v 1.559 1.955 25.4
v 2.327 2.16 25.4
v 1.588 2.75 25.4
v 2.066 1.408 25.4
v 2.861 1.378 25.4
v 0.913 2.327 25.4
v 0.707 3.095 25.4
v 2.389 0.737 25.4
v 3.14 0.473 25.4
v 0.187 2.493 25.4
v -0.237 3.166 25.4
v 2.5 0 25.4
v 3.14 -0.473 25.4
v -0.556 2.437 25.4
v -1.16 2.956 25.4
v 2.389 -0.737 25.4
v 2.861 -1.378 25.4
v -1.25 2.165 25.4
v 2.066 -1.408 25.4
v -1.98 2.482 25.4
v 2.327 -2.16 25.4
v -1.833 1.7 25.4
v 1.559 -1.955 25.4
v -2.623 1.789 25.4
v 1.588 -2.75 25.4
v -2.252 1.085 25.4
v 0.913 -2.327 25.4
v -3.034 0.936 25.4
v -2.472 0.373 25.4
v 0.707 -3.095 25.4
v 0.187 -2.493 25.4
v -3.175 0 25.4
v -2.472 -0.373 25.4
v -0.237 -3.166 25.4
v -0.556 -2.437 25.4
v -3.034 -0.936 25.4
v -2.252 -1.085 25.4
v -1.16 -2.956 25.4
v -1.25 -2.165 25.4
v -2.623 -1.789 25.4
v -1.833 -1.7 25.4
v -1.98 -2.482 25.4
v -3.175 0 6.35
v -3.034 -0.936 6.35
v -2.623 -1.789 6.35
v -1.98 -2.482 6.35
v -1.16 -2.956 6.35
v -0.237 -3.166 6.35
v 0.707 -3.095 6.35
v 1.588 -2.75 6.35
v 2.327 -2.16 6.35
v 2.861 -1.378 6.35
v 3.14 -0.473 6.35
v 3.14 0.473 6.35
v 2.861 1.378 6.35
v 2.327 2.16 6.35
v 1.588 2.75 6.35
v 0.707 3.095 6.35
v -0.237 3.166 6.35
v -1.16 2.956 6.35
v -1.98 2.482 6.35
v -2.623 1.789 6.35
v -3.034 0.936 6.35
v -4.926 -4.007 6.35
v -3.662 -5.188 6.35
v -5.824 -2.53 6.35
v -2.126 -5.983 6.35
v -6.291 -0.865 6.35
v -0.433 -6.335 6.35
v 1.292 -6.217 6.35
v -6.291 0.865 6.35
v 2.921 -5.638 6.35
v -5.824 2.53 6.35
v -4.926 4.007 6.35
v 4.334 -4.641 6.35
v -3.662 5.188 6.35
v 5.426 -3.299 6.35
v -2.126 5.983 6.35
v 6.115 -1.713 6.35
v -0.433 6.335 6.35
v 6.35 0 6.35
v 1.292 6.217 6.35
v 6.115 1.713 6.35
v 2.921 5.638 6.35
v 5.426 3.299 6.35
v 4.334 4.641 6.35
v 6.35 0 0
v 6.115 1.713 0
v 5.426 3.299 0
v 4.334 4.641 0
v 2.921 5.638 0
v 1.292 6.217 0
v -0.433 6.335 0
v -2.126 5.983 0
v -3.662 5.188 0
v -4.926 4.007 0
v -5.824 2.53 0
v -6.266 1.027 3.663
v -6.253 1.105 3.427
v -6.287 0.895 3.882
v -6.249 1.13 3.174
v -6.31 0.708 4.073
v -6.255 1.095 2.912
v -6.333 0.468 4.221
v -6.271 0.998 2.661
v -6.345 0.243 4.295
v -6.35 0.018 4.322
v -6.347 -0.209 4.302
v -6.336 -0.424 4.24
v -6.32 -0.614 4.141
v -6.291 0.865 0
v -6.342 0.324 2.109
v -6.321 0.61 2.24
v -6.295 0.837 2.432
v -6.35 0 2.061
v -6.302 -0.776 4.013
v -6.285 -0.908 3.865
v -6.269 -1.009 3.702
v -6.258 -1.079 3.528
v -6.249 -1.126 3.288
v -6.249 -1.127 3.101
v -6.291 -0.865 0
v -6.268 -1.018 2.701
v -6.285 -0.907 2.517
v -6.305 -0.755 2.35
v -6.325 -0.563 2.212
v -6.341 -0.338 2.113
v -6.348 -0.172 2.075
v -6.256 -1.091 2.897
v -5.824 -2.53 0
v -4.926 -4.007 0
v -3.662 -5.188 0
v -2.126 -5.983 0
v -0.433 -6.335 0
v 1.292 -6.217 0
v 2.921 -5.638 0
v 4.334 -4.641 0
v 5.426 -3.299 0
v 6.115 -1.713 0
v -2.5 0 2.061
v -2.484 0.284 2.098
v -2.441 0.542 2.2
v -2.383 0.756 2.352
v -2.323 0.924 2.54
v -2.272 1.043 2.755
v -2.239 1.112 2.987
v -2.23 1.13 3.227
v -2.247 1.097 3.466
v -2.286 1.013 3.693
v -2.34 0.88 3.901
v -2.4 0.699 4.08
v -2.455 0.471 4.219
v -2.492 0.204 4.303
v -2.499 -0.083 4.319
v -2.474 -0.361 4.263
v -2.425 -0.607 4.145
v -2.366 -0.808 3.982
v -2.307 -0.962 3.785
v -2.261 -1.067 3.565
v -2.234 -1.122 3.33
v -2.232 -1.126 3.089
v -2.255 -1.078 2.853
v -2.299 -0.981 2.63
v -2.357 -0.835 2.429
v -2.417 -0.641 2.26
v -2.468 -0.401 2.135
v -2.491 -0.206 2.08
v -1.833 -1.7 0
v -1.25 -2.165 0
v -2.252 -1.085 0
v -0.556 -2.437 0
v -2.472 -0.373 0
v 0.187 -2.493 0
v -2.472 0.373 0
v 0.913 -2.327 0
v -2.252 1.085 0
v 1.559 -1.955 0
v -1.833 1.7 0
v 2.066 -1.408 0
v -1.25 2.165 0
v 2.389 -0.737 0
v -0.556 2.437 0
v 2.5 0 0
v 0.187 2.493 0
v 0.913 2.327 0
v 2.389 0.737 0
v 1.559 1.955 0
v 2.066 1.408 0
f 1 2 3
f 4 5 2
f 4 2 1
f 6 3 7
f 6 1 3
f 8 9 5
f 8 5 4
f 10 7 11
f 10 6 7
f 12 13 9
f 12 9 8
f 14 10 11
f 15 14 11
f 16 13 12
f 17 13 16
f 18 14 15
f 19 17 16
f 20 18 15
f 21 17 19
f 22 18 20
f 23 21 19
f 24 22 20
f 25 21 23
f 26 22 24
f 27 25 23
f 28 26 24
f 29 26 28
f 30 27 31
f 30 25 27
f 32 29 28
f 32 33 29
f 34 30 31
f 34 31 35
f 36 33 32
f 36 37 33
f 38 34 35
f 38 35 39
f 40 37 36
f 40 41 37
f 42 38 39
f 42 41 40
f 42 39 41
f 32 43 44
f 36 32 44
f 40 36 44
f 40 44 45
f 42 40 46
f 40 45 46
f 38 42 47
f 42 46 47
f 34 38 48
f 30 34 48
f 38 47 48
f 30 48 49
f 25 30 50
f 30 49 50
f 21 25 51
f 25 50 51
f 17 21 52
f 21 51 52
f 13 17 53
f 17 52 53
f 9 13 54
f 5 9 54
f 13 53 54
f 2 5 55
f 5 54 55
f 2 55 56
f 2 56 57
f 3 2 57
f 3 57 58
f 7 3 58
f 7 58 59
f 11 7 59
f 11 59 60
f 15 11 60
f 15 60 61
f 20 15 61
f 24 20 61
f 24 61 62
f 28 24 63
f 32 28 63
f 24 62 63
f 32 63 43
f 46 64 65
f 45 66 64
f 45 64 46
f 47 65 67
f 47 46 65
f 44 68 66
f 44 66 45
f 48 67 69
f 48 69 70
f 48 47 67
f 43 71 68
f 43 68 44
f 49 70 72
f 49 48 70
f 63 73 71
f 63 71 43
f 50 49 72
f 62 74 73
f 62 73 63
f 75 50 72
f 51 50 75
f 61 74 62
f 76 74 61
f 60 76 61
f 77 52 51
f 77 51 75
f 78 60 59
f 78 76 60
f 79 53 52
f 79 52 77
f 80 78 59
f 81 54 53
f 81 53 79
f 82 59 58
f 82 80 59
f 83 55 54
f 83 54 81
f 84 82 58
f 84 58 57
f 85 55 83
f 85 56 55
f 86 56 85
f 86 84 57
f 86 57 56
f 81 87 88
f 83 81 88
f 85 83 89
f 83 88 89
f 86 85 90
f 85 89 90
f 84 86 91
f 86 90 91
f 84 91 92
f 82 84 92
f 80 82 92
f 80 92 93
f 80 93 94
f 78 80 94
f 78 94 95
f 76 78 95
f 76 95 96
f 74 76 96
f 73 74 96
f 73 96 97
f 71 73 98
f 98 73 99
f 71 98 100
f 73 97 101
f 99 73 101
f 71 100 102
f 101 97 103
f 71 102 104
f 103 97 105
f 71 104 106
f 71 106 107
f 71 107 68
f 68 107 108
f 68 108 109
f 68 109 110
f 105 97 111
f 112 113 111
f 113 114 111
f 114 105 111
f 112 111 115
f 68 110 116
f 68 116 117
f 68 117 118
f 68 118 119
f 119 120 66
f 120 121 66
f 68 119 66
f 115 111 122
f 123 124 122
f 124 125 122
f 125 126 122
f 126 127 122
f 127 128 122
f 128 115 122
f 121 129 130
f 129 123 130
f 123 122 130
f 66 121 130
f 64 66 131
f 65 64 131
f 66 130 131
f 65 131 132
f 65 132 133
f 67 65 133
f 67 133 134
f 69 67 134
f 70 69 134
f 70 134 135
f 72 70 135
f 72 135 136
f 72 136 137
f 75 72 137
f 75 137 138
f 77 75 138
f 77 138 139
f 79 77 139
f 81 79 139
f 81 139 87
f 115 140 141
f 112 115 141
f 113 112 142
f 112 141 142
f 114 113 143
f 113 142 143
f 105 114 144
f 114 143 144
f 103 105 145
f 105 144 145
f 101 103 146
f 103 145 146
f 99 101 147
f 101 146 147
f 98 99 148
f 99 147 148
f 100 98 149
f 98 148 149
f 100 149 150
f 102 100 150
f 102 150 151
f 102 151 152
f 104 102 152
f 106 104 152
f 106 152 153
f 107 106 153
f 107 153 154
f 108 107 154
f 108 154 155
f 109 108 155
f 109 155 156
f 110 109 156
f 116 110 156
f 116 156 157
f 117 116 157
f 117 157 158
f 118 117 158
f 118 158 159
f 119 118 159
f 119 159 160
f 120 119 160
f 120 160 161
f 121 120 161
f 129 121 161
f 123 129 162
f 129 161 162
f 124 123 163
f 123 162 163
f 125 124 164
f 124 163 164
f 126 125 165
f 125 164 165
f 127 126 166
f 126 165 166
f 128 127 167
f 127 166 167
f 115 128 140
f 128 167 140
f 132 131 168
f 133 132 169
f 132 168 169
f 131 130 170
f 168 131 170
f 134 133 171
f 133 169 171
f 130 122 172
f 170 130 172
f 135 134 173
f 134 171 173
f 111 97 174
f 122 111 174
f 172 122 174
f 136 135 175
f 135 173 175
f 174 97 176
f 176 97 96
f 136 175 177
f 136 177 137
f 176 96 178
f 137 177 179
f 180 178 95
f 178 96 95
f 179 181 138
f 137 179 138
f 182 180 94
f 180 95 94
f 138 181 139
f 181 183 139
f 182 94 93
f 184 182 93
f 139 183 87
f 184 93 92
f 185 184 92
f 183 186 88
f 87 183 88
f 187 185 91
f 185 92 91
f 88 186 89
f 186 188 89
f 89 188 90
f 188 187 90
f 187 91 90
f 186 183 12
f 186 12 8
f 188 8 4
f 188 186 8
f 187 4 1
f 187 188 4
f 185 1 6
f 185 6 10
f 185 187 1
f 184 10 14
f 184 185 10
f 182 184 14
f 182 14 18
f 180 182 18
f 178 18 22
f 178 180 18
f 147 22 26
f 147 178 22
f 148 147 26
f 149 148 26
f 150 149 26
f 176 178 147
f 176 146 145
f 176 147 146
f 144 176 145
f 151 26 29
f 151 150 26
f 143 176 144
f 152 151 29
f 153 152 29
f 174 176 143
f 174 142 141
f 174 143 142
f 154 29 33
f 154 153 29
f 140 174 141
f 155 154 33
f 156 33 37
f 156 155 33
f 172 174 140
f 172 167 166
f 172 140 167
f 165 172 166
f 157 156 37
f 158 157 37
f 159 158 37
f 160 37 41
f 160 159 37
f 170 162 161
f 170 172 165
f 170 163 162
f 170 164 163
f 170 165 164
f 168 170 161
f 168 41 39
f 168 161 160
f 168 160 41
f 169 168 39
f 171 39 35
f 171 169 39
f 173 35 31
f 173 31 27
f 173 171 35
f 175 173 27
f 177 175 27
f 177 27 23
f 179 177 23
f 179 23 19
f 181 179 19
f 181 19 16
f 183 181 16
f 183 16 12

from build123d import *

# Parameters (mm, degrees)
SKETCH1_R                 = 6.35
SKETCH1_R_2               = 2.5
BOSS_EXTRUDE1_DEPTH       = 6.35
SKETCH2_R                 = 3.175
SKETCH2_R_2               = 2.5
BOSS_EXTRUDE2_DEPTH       = 19.05
F_4_40_TAPPED_HOLE1_D     = 2.2606
F_4_40_TAPPED_HOLE1_DEPTH = 6.349
F_4_40_TAPPED_HOLE1_TIP   = 0.679152758


with BuildPart() as part:
    # Sketch1 → Boss-Extrude1 (new body)
    with BuildSketch(Plane.XY):
        Circle(SKETCH1_R)
        Circle(SKETCH1_R_2, mode=Mode.SUBTRACT)
    extrude(amount=BOSS_EXTRUDE1_DEPTH)

    # Sketch2 → Boss-Extrude2 (add)
    with BuildSketch(Plane.XY.offset(6.35)):
        with Locations(Location((0, 0, 0), (0, 0, 180))):
            Circle(SKETCH2_R)
        Circle(SKETCH2_R_2, mode=Mode.SUBTRACT)
    extrude(amount=BOSS_EXTRUDE2_DEPTH)

    # #4-40 Tapped Hole1
    with Locations(Plane.ZY.offset(6.35)):
        with Locations((3.191608174, 0)):
            Hole(F_4_40_TAPPED_HOLE1_D / 2, depth=F_4_40_TAPPED_HOLE1_DEPTH)
            with Locations((0, 0, -(F_4_40_TAPPED_HOLE1_DEPTH + F_4_40_TAPPED_HOLE1_TIP / 2))):  # 118° drill point
                Cone(0, F_4_40_TAPPED_HOLE1_D / 2, F_4_40_TAPPED_HOLE1_TIP, mode=Mode.SUBTRACT)


solid = part.part
